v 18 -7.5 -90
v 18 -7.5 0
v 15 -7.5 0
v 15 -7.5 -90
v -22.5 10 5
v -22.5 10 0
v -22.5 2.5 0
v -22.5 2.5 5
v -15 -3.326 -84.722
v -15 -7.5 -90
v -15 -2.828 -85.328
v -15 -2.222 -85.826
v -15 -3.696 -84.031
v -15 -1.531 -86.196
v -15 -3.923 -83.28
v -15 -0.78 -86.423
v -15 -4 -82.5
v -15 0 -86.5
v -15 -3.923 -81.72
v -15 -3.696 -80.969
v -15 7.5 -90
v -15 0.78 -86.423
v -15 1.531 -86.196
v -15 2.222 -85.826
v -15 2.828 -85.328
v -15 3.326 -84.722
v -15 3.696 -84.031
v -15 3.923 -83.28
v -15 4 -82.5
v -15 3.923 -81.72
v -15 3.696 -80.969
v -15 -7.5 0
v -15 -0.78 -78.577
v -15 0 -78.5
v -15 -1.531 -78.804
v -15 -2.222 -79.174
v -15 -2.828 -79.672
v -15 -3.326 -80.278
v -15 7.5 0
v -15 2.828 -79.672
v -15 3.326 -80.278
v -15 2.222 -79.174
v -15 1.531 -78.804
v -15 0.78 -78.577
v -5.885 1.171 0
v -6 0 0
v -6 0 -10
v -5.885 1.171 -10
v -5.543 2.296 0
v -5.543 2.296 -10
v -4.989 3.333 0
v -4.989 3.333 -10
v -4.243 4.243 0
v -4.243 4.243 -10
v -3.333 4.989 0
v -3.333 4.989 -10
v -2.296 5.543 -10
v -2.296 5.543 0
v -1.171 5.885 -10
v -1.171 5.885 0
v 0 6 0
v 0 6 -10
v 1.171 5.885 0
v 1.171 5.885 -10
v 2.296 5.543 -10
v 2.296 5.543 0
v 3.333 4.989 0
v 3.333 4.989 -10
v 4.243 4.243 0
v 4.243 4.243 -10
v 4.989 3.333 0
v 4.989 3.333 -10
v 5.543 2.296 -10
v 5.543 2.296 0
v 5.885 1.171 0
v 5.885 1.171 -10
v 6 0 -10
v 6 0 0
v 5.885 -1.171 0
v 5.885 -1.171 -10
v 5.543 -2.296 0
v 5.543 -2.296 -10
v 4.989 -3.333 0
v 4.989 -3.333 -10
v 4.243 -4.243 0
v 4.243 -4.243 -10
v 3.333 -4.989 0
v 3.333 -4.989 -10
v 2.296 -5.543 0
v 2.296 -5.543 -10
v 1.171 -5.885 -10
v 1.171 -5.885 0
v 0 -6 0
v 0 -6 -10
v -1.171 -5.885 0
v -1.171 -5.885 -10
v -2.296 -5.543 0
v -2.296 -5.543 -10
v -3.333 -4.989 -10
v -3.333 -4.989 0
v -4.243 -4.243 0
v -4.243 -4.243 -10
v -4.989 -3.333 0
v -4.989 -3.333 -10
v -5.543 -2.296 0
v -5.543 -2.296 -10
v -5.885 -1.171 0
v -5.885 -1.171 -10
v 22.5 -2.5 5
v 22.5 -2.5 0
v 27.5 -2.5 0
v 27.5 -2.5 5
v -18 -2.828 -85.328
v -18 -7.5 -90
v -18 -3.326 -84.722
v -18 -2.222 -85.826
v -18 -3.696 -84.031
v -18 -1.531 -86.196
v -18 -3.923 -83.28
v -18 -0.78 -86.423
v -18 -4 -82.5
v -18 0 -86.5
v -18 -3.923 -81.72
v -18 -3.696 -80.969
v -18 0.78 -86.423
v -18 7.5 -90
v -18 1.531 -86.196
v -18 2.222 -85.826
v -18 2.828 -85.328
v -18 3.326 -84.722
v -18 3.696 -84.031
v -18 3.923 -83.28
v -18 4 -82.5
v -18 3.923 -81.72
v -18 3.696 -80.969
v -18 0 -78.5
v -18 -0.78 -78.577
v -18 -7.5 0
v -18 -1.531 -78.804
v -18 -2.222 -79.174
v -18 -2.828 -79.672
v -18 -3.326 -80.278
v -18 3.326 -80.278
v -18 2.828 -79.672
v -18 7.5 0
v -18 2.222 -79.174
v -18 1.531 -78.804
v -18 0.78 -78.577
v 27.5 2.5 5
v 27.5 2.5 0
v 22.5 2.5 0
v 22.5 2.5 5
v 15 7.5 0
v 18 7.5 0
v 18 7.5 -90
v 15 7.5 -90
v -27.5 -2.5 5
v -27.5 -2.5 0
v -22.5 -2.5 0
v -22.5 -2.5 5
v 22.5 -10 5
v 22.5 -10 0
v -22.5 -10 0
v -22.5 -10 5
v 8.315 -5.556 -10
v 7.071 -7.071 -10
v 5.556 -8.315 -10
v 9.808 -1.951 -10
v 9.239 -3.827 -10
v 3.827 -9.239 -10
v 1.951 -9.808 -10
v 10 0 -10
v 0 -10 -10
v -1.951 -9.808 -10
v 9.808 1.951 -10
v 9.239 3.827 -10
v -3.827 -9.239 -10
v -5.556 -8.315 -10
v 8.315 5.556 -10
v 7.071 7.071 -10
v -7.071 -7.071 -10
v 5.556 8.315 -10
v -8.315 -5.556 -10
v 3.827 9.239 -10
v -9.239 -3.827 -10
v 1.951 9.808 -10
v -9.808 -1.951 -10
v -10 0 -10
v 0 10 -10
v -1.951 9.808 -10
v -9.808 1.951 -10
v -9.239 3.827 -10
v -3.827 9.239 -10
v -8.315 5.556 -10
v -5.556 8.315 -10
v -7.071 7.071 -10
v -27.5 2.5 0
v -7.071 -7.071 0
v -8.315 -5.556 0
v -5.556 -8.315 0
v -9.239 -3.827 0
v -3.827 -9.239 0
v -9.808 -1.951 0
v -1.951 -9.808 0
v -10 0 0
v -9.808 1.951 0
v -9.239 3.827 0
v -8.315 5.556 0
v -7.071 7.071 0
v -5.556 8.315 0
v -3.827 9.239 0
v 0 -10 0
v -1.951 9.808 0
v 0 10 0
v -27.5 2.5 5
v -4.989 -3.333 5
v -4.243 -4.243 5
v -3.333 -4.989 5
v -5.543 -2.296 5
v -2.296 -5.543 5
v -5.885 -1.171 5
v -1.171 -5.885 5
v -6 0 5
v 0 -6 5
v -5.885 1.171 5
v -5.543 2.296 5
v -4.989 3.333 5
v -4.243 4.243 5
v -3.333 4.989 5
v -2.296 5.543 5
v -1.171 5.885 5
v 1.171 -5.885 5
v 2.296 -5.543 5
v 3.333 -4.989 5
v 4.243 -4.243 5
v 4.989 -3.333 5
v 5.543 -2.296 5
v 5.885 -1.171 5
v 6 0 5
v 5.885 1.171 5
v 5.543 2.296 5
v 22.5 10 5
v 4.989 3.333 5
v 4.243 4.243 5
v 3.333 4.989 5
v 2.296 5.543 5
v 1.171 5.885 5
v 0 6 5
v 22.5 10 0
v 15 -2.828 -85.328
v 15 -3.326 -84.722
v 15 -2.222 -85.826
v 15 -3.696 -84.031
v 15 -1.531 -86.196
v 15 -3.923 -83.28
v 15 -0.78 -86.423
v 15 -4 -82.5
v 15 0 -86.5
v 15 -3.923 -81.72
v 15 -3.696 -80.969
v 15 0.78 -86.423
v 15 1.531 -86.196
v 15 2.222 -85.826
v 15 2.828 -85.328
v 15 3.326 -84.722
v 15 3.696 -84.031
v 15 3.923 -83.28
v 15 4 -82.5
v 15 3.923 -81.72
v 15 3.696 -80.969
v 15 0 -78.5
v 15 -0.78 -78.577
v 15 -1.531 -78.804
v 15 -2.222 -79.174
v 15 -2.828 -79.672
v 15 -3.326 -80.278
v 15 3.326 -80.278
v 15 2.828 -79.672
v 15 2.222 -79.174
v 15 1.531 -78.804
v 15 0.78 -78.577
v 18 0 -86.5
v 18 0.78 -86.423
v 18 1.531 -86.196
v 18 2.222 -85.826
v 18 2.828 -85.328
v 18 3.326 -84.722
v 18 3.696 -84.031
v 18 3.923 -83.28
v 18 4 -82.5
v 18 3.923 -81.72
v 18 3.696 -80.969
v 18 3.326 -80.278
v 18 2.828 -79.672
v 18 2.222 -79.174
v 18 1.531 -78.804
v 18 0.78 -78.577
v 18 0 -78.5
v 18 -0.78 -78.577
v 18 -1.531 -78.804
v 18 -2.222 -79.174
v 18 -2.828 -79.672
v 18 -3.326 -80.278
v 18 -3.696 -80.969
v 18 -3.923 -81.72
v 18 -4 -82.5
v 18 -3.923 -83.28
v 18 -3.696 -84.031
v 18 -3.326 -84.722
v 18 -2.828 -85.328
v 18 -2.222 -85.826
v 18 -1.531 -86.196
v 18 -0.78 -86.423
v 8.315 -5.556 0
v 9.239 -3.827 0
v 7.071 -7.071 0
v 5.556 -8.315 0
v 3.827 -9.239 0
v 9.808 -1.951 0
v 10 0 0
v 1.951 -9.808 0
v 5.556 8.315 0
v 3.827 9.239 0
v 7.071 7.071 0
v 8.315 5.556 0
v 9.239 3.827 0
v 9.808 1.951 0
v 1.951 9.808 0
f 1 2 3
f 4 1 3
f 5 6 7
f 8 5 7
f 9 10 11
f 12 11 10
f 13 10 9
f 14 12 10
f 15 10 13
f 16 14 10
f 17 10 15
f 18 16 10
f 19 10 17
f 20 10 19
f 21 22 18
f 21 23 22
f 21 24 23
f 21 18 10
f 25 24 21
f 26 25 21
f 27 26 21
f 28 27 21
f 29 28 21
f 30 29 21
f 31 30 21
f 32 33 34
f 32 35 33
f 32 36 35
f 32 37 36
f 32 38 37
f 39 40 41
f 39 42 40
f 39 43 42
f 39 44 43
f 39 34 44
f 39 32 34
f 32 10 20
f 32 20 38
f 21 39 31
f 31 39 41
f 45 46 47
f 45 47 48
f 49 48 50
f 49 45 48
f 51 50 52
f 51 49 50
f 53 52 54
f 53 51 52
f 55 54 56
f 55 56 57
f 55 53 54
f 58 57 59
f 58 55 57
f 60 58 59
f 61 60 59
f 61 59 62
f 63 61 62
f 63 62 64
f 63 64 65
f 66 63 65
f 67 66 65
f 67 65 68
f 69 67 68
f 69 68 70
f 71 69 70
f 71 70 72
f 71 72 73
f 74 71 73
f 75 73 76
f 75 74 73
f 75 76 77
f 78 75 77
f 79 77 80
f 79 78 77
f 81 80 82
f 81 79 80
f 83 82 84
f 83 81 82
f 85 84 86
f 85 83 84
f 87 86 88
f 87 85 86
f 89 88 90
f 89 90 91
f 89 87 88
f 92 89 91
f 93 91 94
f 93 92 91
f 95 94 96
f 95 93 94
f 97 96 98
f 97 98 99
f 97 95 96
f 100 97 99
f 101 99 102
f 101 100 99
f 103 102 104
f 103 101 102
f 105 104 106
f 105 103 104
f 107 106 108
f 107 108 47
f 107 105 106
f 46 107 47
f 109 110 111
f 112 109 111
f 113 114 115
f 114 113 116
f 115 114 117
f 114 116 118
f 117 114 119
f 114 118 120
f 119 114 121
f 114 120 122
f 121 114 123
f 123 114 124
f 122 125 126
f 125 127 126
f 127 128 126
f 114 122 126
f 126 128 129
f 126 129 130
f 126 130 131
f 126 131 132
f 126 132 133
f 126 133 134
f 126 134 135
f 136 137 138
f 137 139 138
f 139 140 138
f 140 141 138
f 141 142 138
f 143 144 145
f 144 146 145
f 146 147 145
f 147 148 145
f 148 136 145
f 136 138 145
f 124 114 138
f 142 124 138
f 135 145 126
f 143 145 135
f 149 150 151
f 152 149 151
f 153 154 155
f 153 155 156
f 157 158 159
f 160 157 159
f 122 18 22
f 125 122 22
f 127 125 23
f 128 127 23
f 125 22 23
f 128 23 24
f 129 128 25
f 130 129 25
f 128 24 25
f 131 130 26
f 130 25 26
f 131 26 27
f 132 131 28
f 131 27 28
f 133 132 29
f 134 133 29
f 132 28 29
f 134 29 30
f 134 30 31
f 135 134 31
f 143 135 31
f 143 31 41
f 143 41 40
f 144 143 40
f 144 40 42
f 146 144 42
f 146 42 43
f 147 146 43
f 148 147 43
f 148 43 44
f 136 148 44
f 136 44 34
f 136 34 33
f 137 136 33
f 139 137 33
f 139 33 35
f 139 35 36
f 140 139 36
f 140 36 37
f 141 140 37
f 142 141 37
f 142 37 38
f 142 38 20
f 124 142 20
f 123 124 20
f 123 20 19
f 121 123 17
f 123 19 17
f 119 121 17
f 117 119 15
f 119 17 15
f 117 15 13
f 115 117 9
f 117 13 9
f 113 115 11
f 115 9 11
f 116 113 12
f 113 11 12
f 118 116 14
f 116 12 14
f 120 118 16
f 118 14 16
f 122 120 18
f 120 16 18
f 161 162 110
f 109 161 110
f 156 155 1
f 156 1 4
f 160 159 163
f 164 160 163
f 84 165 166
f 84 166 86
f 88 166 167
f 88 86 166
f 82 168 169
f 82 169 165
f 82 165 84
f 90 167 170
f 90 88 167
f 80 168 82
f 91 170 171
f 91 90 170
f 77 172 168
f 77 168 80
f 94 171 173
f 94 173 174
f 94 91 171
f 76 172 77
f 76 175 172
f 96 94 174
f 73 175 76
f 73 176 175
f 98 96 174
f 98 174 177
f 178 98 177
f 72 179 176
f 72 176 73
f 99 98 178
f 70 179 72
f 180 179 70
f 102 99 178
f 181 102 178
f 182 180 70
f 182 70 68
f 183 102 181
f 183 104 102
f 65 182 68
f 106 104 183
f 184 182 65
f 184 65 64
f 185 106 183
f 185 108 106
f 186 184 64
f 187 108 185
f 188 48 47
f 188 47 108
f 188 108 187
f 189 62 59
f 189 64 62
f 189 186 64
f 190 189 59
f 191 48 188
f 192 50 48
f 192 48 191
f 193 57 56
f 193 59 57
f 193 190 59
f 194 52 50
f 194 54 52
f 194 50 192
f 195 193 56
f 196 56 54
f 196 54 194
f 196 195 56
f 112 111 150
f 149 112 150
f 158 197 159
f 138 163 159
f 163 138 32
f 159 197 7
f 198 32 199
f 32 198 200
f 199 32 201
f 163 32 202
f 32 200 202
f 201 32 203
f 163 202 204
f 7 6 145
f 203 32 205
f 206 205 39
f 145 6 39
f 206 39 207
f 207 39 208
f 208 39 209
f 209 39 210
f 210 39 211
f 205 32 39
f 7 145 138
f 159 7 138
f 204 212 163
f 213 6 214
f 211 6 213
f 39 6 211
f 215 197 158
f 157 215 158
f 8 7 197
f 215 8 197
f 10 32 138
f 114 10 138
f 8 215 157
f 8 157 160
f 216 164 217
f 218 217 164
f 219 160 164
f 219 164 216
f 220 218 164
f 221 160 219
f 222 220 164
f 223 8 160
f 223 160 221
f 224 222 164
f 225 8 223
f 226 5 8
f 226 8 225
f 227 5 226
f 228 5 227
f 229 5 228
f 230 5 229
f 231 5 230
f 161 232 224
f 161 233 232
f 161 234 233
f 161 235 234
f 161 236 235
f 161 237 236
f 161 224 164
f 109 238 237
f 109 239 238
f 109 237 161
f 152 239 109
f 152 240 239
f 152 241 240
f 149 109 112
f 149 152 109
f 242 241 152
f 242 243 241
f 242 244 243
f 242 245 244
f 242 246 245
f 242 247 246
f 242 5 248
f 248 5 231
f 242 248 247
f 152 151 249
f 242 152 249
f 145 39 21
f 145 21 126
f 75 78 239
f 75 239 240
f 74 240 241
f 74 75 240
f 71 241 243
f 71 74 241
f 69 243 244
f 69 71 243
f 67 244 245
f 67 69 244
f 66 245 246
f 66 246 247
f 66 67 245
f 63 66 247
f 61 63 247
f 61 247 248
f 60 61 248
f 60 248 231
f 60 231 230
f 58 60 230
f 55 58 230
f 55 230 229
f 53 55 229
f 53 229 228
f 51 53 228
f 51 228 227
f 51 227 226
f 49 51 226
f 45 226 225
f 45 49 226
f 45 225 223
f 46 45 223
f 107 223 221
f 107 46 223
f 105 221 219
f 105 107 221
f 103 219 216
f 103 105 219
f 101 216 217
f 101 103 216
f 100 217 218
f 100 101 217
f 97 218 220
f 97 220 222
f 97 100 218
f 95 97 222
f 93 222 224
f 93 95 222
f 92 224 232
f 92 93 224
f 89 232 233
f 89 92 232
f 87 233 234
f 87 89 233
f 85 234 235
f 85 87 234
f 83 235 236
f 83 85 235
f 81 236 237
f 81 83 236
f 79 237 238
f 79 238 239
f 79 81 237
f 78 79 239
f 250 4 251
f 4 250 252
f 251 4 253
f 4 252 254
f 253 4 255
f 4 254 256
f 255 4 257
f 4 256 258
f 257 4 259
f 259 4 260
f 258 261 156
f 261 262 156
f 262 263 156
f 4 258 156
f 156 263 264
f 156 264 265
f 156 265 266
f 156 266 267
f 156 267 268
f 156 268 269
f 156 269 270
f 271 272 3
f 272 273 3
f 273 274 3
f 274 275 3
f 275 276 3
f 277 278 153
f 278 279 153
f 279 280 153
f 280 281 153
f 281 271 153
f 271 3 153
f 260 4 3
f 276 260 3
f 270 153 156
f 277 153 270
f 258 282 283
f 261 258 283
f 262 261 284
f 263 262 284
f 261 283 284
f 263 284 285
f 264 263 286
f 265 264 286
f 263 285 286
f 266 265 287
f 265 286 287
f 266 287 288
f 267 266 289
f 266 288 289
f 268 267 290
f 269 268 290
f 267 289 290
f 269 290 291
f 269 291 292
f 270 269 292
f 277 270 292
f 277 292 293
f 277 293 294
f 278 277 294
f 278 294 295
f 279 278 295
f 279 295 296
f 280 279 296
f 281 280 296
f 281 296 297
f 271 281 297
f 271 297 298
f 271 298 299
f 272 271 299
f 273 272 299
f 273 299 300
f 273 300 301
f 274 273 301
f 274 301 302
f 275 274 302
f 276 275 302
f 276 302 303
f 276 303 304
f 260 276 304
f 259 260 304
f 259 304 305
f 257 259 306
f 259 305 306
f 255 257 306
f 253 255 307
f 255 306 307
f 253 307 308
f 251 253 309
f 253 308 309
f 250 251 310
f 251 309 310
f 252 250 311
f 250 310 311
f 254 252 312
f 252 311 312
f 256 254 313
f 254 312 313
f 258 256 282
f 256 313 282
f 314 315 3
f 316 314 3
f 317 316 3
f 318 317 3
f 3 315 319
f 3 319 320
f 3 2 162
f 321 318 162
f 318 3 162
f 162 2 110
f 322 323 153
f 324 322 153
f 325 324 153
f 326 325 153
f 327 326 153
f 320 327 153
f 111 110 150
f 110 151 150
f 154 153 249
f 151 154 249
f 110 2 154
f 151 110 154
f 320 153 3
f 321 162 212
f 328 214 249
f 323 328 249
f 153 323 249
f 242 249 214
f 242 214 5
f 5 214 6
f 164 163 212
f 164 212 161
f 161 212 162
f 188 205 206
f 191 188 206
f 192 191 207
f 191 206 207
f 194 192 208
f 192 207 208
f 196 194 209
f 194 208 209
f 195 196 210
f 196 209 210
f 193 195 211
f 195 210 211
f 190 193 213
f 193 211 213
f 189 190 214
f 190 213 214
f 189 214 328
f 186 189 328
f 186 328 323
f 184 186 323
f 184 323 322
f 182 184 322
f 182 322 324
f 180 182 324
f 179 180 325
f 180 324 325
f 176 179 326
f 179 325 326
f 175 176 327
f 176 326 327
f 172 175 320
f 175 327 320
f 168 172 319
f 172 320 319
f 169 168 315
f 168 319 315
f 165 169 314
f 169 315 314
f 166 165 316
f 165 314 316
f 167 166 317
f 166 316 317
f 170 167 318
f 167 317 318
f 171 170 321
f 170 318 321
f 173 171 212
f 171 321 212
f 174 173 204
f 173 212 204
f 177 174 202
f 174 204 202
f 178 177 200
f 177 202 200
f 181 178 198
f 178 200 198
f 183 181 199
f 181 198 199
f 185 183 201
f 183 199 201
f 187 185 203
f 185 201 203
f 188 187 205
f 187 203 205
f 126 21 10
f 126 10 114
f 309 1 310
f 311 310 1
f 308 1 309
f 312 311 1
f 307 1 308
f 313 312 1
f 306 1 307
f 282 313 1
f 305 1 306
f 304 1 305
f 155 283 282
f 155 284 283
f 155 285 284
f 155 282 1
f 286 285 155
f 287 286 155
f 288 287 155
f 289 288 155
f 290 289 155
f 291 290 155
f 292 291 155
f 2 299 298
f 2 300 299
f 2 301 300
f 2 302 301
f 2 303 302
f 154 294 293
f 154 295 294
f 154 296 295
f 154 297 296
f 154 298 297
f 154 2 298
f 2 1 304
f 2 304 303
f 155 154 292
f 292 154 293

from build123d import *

# Parameters (mm, degrees)
SKETCH_1_R          = 6
EXTRUDE_1_DEPTH     = 5
SKETCH_2_W          = 3
SKETCH_2_H          = 15
EXTRUDE_2_DEPTH     = 90
SKETCH_4_R          = 4
CUT_EXTRUDE_1_DEPTH = 46.5
SKETCH_5_R          = 10
SKETCH_5_R_2        = 6
EXTRUDE_3_DEPTH     = 10


with BuildPart() as part:
    # 草圖1 → 填料-伸長1 (new body)
    with BuildSketch(Plane.XY):
        Polygon((-22.5, -2.5), (-22.5, -10), (22.5, -10), (22.5, -2.5), (27.5, -2.5), (27.5, 2.5), (22.5, 2.5), (22.5, 10), (-22.5, 10), (-22.5, 2.5), (-27.5, 2.5), (-27.5, -2.5), align=None)
        Circle(SKETCH_1_R, mode=Mode.SUBTRACT)
    extrude(amount=EXTRUDE_1_DEPTH)

    # 草圖2 → 填料-伸長2 (add)
    with BuildSketch(Plane(origin=(0, 0, 0), x_dir=(-1, 0, 0), z_dir=(0, 0, -1))):
        with Locations((-16.5, 0)):
            Rectangle(SKETCH_2_W, SKETCH_2_H)
        with Locations((16.5, 0)):
            Rectangle(SKETCH_2_W, SKETCH_2_H)
    extrude(amount=EXTRUDE_2_DEPTH)

    # 草圖4 → 除料-伸長1 (cut, through all)
    with BuildSketch(Plane(origin=(18, 0, 0), x_dir=(0, 0, -1), z_dir=(1, 0, 0))):
        with Locations((82.5, 0)):
            Circle(SKETCH_4_R)
    extrude(amount=-CUT_EXTRUDE_1_DEPTH, mode=Mode.SUBTRACT)

    # 草圖5 → 填料-伸長3 (add)
    with BuildSketch(Plane(origin=(0, 0, 0), x_dir=(-1, 0, 0), z_dir=(0, 0, -1))):
        Circle(SKETCH_5_R)
        Circle(SKETCH_5_R_2, mode=Mode.SUBTRACT)
    extrude(amount=EXTRUDE_3_DEPTH)


solid = part.part
